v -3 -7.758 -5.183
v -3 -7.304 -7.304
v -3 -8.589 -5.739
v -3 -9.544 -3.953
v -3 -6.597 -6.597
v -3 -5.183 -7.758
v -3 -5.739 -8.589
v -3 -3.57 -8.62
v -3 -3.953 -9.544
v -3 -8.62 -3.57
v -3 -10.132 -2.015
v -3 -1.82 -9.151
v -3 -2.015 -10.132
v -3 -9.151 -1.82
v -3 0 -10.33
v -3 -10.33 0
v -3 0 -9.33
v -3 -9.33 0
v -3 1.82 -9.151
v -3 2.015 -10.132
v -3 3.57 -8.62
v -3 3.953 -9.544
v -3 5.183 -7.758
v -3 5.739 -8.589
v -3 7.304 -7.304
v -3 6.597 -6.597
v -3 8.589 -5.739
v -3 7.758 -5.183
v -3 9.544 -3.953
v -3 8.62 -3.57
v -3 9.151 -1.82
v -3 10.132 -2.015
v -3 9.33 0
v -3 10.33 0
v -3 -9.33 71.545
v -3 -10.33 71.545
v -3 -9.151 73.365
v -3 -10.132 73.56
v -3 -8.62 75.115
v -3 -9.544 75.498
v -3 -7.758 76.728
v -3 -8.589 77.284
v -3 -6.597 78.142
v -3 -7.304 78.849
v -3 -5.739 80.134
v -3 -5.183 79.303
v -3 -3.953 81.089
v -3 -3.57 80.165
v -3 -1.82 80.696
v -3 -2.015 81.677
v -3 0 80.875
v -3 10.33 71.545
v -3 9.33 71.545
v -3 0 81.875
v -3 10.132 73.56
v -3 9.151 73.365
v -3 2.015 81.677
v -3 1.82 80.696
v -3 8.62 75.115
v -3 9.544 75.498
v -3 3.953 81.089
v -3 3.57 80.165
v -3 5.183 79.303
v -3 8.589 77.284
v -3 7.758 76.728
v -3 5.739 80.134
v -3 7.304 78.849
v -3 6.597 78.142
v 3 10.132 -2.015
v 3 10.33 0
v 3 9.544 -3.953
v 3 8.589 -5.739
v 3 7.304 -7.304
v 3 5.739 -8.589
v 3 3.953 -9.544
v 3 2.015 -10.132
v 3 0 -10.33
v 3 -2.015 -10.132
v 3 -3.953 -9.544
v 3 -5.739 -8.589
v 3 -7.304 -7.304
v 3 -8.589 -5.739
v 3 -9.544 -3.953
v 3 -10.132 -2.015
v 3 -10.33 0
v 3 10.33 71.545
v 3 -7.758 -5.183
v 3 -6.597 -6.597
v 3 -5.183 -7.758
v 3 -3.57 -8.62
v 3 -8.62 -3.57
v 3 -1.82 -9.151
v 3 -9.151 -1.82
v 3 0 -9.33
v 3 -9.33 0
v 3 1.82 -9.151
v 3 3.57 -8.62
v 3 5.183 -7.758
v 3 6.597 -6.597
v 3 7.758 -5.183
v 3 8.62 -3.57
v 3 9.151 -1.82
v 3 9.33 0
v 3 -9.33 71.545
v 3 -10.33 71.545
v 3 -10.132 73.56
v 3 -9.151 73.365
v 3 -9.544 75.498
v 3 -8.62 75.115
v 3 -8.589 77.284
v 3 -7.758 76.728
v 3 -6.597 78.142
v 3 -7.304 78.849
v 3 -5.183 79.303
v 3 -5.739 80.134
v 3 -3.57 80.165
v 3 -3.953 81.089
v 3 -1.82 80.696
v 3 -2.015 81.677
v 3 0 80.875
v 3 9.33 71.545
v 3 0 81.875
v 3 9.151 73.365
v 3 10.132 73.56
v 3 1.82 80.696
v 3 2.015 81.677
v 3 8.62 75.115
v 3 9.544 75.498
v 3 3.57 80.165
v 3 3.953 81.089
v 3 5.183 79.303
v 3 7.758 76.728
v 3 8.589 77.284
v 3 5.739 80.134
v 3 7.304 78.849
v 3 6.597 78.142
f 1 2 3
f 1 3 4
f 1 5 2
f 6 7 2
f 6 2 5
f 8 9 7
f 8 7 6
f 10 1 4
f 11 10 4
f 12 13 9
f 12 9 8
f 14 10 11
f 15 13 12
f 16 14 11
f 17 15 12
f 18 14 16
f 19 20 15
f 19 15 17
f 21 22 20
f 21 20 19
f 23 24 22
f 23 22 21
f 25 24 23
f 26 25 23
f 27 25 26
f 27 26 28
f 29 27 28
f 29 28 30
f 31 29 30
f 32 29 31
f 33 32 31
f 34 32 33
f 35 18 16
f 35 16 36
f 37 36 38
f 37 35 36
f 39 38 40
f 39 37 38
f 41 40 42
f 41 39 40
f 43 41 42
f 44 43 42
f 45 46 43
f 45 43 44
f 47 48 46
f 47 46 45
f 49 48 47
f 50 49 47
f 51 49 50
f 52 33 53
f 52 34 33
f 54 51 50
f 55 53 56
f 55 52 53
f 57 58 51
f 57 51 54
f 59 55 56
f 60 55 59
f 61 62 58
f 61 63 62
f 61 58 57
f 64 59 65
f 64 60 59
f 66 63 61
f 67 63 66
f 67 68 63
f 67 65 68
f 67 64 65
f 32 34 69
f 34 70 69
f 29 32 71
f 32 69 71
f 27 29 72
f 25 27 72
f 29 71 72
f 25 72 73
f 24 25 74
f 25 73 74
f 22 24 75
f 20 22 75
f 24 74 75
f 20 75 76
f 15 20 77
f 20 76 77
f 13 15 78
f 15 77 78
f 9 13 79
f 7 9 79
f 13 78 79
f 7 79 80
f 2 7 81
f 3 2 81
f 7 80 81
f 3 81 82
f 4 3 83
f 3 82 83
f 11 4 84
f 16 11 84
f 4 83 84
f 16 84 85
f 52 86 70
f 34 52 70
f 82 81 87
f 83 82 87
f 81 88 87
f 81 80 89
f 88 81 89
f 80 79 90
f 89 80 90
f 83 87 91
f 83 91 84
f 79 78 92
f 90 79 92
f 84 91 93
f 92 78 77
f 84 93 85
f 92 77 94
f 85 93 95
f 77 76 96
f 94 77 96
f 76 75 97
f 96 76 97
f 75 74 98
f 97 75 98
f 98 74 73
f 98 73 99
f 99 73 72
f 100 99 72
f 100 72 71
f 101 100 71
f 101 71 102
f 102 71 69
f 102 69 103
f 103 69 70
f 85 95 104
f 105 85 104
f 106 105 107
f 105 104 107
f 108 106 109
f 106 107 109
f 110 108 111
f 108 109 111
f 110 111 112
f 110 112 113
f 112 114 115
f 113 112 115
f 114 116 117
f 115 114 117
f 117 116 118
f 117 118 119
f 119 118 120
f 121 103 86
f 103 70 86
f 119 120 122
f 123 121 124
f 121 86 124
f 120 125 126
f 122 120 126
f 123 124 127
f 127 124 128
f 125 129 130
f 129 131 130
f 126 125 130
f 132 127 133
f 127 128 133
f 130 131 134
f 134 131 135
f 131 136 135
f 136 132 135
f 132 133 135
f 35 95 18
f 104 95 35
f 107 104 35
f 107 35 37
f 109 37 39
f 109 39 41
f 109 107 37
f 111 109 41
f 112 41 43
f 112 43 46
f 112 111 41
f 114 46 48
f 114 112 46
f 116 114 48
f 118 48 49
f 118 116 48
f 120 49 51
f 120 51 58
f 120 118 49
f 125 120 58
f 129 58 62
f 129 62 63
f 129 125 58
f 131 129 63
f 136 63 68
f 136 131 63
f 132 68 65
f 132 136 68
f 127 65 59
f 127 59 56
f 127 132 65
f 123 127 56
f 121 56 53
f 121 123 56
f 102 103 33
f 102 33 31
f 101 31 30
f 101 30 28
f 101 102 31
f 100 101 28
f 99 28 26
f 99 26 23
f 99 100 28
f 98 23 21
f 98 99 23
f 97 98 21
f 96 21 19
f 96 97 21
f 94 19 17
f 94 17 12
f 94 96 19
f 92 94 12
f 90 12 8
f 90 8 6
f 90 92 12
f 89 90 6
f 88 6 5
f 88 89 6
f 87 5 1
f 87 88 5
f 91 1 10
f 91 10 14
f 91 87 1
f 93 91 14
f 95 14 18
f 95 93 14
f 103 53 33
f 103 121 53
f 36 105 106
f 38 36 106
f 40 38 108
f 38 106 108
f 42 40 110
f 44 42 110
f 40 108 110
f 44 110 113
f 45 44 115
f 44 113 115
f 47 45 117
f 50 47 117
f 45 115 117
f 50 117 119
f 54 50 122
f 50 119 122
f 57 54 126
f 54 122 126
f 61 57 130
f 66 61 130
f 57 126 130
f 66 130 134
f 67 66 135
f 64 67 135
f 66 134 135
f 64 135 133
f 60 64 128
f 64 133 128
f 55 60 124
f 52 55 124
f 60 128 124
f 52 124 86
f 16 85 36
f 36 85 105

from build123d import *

# Parameters (mm, degrees)
EXTRUDE_THIN1_DEPTH = 3


with BuildPart() as part:
    # Sketch1 → Extrude-Thin1 (new, symmetric)
    with BuildSketch(Plane(origin=(0, 0, 0), x_dir=(0, 0, -1), z_dir=(1, 0, 0))):
        with BuildLine():
            Line((-71.545, 10.33), (0, 10.33))
            ThreePointArc((0, 10.33), (10.33, 0), (0, -10.33))
            Line((0, -10.33), (-71.545, -10.33))
            ThreePointArc((-71.545, -10.33), (-81.875, 0), (-71.545, 10.33))
        make_face()
        with BuildLine():
            Line((-71.545, 9.33), (0, 9.33))
            ThreePointArc((0, 9.33), (9.33, 0), (0, -9.33))
            Line((0, -9.33), (-71.545, -9.33))
            ThreePointArc((-71.545, -9.33), (-80.875, 0), (-71.545, 9.33))
        make_face(mode=Mode.SUBTRACT)
    extrude(amount=EXTRUDE_THIN1_DEPTH, both=True)


solid = part.part
